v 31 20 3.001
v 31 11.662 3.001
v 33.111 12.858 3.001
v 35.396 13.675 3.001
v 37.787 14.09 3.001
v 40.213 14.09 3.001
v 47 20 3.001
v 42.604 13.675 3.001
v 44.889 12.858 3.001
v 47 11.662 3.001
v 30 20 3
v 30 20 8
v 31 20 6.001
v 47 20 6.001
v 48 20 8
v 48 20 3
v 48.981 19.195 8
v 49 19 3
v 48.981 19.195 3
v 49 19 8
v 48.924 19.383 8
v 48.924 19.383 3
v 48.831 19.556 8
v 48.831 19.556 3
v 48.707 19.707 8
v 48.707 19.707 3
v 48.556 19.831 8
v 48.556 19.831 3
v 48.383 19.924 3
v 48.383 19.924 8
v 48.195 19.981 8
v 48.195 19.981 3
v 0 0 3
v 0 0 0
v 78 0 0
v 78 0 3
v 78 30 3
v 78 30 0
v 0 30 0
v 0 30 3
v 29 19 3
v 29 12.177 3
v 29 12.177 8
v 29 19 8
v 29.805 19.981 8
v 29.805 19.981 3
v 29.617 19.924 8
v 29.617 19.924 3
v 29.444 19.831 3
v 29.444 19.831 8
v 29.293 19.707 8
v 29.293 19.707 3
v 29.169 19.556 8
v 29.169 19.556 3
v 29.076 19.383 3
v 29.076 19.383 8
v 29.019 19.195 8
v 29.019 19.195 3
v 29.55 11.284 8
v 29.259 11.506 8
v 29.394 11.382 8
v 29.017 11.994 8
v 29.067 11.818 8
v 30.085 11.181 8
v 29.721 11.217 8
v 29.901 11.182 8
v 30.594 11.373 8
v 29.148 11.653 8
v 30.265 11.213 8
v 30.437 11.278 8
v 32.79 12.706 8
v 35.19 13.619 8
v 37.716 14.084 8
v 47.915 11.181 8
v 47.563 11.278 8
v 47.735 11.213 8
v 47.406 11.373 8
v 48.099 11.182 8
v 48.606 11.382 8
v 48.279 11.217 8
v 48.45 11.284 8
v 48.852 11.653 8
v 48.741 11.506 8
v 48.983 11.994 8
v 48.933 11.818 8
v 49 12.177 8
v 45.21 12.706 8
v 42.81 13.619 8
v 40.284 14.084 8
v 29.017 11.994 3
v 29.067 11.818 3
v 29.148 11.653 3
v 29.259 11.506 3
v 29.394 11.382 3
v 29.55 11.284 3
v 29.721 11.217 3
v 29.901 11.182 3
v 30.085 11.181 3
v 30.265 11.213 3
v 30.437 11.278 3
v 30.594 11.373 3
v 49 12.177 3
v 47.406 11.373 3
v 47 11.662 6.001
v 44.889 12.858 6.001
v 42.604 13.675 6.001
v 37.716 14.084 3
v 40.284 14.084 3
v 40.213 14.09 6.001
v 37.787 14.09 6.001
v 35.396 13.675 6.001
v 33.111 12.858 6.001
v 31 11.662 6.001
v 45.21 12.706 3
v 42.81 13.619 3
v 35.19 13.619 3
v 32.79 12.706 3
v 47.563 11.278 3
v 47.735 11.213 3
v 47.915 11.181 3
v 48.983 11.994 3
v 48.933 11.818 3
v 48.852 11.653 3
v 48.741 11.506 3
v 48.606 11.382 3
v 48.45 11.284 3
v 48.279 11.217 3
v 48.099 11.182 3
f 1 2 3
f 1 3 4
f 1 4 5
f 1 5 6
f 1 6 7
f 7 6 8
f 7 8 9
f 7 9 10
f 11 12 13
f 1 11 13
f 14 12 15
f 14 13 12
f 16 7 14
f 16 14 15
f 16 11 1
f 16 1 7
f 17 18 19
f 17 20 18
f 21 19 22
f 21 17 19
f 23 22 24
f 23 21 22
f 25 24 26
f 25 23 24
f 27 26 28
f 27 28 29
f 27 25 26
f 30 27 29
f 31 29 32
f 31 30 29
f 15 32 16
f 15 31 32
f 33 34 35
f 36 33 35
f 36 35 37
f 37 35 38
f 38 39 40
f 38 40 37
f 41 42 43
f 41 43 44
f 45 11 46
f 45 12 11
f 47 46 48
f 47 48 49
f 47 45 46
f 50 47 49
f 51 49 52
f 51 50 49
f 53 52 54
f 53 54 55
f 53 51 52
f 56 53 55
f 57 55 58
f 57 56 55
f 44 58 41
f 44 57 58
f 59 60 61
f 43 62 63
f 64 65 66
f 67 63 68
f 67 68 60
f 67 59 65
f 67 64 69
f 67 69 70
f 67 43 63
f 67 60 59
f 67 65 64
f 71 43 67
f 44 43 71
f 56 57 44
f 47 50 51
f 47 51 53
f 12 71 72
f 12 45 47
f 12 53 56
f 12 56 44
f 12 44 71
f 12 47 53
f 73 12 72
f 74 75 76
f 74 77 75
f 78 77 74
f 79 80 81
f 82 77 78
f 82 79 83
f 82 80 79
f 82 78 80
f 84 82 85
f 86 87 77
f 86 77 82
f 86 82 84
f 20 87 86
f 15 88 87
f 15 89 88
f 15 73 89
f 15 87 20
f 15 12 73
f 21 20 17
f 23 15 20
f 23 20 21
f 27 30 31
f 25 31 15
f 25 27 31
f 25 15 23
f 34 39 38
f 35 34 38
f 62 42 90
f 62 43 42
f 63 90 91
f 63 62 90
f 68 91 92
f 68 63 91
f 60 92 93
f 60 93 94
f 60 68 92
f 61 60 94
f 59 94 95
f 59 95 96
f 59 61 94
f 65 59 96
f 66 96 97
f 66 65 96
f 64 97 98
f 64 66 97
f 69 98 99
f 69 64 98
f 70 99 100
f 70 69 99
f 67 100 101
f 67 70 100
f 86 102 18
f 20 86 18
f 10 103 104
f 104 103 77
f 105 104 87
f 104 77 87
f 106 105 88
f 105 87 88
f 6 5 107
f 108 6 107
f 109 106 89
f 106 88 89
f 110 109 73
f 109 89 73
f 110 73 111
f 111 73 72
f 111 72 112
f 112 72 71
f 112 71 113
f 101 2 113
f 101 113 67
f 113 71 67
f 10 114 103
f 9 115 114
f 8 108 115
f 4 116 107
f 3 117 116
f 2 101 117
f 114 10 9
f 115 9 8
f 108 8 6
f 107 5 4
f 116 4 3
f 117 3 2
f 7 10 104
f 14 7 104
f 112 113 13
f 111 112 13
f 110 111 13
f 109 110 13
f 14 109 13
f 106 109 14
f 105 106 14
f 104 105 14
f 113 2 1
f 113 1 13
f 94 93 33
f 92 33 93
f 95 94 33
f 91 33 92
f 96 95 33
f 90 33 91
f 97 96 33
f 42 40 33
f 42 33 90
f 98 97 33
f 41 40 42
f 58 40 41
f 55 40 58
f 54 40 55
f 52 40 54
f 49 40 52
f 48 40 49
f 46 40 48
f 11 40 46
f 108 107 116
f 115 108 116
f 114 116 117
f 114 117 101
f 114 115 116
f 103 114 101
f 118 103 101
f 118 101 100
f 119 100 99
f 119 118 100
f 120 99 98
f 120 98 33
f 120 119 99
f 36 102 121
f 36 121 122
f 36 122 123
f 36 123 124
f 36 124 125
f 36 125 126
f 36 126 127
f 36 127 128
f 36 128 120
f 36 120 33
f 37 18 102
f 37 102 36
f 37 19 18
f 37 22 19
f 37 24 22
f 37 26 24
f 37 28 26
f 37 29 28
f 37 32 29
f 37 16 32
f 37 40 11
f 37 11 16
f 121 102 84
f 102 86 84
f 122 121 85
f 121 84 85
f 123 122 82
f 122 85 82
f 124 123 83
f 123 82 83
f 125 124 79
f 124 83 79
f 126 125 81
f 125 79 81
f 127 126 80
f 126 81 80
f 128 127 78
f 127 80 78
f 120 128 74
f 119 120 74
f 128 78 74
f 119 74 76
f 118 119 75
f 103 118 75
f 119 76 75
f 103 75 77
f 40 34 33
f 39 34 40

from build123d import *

# Parameters (mm, degrees)
BOX_W           = 78
BOX_H           = 30
BOX_DEPTH       = 3
SKETCH001_W     = 20
SKETCH001_H     = 10
PAD_DEPTH       = 5
SKETCH002_W     = 16
SKETCH002_H     = 3
POCKET_DEPTH    = 20.001
POCKET001_DEPTH = 5
FILLET_R        = 1


with BuildPart() as part:
    # Box → Box (join)
    with BuildSketch(Plane.XY):
        with Locations((39, 15)):
            Rectangle(BOX_W, BOX_H)
    extrude(amount=BOX_DEPTH)

    # Sketch001 (on Face6 of Box) → Pad (join)
    with BuildSketch(Plane.XY.offset(3)):
        with Locations((39, 15)):
            Rectangle(SKETCH001_W, SKETCH001_H)
    extrude(amount=PAD_DEPTH)

    # Sketch002 (on Face8 of Pad) → Pocket (cut, through all)
    with BuildSketch(Plane.XZ.offset(-10)):
        with Locations((39, 4.501)):
            Rectangle(SKETCH002_W, SKETCH002_H)
    extrude(amount=-POCKET_DEPTH, mode=Mode.SUBTRACT)

    # Sketch003 (on Face11 of Pocket) → Pocket001 (cut)
    with BuildSketch(Plane.XY.offset(8)):
        with BuildLine():
            ThreePointArc((49, 10), (39, 14.142136), (29, 10))
            Line((29, 10), (49, 10))
        make_face()
    extrude(amount=-POCKET001_DEPTH, mode=Mode.SUBTRACT)

    # Fillet
    fillet_edges = [part.edges().sort_by_distance(p)[0] for p in [
        (49, 10, 5.5),
        (49, 20, 5.5),
        (29, 20, 5.5),
        (29, 10, 5.5),
    ]]
    fillet(fillet_edges, radius=FILLET_R)


solid = part.part
